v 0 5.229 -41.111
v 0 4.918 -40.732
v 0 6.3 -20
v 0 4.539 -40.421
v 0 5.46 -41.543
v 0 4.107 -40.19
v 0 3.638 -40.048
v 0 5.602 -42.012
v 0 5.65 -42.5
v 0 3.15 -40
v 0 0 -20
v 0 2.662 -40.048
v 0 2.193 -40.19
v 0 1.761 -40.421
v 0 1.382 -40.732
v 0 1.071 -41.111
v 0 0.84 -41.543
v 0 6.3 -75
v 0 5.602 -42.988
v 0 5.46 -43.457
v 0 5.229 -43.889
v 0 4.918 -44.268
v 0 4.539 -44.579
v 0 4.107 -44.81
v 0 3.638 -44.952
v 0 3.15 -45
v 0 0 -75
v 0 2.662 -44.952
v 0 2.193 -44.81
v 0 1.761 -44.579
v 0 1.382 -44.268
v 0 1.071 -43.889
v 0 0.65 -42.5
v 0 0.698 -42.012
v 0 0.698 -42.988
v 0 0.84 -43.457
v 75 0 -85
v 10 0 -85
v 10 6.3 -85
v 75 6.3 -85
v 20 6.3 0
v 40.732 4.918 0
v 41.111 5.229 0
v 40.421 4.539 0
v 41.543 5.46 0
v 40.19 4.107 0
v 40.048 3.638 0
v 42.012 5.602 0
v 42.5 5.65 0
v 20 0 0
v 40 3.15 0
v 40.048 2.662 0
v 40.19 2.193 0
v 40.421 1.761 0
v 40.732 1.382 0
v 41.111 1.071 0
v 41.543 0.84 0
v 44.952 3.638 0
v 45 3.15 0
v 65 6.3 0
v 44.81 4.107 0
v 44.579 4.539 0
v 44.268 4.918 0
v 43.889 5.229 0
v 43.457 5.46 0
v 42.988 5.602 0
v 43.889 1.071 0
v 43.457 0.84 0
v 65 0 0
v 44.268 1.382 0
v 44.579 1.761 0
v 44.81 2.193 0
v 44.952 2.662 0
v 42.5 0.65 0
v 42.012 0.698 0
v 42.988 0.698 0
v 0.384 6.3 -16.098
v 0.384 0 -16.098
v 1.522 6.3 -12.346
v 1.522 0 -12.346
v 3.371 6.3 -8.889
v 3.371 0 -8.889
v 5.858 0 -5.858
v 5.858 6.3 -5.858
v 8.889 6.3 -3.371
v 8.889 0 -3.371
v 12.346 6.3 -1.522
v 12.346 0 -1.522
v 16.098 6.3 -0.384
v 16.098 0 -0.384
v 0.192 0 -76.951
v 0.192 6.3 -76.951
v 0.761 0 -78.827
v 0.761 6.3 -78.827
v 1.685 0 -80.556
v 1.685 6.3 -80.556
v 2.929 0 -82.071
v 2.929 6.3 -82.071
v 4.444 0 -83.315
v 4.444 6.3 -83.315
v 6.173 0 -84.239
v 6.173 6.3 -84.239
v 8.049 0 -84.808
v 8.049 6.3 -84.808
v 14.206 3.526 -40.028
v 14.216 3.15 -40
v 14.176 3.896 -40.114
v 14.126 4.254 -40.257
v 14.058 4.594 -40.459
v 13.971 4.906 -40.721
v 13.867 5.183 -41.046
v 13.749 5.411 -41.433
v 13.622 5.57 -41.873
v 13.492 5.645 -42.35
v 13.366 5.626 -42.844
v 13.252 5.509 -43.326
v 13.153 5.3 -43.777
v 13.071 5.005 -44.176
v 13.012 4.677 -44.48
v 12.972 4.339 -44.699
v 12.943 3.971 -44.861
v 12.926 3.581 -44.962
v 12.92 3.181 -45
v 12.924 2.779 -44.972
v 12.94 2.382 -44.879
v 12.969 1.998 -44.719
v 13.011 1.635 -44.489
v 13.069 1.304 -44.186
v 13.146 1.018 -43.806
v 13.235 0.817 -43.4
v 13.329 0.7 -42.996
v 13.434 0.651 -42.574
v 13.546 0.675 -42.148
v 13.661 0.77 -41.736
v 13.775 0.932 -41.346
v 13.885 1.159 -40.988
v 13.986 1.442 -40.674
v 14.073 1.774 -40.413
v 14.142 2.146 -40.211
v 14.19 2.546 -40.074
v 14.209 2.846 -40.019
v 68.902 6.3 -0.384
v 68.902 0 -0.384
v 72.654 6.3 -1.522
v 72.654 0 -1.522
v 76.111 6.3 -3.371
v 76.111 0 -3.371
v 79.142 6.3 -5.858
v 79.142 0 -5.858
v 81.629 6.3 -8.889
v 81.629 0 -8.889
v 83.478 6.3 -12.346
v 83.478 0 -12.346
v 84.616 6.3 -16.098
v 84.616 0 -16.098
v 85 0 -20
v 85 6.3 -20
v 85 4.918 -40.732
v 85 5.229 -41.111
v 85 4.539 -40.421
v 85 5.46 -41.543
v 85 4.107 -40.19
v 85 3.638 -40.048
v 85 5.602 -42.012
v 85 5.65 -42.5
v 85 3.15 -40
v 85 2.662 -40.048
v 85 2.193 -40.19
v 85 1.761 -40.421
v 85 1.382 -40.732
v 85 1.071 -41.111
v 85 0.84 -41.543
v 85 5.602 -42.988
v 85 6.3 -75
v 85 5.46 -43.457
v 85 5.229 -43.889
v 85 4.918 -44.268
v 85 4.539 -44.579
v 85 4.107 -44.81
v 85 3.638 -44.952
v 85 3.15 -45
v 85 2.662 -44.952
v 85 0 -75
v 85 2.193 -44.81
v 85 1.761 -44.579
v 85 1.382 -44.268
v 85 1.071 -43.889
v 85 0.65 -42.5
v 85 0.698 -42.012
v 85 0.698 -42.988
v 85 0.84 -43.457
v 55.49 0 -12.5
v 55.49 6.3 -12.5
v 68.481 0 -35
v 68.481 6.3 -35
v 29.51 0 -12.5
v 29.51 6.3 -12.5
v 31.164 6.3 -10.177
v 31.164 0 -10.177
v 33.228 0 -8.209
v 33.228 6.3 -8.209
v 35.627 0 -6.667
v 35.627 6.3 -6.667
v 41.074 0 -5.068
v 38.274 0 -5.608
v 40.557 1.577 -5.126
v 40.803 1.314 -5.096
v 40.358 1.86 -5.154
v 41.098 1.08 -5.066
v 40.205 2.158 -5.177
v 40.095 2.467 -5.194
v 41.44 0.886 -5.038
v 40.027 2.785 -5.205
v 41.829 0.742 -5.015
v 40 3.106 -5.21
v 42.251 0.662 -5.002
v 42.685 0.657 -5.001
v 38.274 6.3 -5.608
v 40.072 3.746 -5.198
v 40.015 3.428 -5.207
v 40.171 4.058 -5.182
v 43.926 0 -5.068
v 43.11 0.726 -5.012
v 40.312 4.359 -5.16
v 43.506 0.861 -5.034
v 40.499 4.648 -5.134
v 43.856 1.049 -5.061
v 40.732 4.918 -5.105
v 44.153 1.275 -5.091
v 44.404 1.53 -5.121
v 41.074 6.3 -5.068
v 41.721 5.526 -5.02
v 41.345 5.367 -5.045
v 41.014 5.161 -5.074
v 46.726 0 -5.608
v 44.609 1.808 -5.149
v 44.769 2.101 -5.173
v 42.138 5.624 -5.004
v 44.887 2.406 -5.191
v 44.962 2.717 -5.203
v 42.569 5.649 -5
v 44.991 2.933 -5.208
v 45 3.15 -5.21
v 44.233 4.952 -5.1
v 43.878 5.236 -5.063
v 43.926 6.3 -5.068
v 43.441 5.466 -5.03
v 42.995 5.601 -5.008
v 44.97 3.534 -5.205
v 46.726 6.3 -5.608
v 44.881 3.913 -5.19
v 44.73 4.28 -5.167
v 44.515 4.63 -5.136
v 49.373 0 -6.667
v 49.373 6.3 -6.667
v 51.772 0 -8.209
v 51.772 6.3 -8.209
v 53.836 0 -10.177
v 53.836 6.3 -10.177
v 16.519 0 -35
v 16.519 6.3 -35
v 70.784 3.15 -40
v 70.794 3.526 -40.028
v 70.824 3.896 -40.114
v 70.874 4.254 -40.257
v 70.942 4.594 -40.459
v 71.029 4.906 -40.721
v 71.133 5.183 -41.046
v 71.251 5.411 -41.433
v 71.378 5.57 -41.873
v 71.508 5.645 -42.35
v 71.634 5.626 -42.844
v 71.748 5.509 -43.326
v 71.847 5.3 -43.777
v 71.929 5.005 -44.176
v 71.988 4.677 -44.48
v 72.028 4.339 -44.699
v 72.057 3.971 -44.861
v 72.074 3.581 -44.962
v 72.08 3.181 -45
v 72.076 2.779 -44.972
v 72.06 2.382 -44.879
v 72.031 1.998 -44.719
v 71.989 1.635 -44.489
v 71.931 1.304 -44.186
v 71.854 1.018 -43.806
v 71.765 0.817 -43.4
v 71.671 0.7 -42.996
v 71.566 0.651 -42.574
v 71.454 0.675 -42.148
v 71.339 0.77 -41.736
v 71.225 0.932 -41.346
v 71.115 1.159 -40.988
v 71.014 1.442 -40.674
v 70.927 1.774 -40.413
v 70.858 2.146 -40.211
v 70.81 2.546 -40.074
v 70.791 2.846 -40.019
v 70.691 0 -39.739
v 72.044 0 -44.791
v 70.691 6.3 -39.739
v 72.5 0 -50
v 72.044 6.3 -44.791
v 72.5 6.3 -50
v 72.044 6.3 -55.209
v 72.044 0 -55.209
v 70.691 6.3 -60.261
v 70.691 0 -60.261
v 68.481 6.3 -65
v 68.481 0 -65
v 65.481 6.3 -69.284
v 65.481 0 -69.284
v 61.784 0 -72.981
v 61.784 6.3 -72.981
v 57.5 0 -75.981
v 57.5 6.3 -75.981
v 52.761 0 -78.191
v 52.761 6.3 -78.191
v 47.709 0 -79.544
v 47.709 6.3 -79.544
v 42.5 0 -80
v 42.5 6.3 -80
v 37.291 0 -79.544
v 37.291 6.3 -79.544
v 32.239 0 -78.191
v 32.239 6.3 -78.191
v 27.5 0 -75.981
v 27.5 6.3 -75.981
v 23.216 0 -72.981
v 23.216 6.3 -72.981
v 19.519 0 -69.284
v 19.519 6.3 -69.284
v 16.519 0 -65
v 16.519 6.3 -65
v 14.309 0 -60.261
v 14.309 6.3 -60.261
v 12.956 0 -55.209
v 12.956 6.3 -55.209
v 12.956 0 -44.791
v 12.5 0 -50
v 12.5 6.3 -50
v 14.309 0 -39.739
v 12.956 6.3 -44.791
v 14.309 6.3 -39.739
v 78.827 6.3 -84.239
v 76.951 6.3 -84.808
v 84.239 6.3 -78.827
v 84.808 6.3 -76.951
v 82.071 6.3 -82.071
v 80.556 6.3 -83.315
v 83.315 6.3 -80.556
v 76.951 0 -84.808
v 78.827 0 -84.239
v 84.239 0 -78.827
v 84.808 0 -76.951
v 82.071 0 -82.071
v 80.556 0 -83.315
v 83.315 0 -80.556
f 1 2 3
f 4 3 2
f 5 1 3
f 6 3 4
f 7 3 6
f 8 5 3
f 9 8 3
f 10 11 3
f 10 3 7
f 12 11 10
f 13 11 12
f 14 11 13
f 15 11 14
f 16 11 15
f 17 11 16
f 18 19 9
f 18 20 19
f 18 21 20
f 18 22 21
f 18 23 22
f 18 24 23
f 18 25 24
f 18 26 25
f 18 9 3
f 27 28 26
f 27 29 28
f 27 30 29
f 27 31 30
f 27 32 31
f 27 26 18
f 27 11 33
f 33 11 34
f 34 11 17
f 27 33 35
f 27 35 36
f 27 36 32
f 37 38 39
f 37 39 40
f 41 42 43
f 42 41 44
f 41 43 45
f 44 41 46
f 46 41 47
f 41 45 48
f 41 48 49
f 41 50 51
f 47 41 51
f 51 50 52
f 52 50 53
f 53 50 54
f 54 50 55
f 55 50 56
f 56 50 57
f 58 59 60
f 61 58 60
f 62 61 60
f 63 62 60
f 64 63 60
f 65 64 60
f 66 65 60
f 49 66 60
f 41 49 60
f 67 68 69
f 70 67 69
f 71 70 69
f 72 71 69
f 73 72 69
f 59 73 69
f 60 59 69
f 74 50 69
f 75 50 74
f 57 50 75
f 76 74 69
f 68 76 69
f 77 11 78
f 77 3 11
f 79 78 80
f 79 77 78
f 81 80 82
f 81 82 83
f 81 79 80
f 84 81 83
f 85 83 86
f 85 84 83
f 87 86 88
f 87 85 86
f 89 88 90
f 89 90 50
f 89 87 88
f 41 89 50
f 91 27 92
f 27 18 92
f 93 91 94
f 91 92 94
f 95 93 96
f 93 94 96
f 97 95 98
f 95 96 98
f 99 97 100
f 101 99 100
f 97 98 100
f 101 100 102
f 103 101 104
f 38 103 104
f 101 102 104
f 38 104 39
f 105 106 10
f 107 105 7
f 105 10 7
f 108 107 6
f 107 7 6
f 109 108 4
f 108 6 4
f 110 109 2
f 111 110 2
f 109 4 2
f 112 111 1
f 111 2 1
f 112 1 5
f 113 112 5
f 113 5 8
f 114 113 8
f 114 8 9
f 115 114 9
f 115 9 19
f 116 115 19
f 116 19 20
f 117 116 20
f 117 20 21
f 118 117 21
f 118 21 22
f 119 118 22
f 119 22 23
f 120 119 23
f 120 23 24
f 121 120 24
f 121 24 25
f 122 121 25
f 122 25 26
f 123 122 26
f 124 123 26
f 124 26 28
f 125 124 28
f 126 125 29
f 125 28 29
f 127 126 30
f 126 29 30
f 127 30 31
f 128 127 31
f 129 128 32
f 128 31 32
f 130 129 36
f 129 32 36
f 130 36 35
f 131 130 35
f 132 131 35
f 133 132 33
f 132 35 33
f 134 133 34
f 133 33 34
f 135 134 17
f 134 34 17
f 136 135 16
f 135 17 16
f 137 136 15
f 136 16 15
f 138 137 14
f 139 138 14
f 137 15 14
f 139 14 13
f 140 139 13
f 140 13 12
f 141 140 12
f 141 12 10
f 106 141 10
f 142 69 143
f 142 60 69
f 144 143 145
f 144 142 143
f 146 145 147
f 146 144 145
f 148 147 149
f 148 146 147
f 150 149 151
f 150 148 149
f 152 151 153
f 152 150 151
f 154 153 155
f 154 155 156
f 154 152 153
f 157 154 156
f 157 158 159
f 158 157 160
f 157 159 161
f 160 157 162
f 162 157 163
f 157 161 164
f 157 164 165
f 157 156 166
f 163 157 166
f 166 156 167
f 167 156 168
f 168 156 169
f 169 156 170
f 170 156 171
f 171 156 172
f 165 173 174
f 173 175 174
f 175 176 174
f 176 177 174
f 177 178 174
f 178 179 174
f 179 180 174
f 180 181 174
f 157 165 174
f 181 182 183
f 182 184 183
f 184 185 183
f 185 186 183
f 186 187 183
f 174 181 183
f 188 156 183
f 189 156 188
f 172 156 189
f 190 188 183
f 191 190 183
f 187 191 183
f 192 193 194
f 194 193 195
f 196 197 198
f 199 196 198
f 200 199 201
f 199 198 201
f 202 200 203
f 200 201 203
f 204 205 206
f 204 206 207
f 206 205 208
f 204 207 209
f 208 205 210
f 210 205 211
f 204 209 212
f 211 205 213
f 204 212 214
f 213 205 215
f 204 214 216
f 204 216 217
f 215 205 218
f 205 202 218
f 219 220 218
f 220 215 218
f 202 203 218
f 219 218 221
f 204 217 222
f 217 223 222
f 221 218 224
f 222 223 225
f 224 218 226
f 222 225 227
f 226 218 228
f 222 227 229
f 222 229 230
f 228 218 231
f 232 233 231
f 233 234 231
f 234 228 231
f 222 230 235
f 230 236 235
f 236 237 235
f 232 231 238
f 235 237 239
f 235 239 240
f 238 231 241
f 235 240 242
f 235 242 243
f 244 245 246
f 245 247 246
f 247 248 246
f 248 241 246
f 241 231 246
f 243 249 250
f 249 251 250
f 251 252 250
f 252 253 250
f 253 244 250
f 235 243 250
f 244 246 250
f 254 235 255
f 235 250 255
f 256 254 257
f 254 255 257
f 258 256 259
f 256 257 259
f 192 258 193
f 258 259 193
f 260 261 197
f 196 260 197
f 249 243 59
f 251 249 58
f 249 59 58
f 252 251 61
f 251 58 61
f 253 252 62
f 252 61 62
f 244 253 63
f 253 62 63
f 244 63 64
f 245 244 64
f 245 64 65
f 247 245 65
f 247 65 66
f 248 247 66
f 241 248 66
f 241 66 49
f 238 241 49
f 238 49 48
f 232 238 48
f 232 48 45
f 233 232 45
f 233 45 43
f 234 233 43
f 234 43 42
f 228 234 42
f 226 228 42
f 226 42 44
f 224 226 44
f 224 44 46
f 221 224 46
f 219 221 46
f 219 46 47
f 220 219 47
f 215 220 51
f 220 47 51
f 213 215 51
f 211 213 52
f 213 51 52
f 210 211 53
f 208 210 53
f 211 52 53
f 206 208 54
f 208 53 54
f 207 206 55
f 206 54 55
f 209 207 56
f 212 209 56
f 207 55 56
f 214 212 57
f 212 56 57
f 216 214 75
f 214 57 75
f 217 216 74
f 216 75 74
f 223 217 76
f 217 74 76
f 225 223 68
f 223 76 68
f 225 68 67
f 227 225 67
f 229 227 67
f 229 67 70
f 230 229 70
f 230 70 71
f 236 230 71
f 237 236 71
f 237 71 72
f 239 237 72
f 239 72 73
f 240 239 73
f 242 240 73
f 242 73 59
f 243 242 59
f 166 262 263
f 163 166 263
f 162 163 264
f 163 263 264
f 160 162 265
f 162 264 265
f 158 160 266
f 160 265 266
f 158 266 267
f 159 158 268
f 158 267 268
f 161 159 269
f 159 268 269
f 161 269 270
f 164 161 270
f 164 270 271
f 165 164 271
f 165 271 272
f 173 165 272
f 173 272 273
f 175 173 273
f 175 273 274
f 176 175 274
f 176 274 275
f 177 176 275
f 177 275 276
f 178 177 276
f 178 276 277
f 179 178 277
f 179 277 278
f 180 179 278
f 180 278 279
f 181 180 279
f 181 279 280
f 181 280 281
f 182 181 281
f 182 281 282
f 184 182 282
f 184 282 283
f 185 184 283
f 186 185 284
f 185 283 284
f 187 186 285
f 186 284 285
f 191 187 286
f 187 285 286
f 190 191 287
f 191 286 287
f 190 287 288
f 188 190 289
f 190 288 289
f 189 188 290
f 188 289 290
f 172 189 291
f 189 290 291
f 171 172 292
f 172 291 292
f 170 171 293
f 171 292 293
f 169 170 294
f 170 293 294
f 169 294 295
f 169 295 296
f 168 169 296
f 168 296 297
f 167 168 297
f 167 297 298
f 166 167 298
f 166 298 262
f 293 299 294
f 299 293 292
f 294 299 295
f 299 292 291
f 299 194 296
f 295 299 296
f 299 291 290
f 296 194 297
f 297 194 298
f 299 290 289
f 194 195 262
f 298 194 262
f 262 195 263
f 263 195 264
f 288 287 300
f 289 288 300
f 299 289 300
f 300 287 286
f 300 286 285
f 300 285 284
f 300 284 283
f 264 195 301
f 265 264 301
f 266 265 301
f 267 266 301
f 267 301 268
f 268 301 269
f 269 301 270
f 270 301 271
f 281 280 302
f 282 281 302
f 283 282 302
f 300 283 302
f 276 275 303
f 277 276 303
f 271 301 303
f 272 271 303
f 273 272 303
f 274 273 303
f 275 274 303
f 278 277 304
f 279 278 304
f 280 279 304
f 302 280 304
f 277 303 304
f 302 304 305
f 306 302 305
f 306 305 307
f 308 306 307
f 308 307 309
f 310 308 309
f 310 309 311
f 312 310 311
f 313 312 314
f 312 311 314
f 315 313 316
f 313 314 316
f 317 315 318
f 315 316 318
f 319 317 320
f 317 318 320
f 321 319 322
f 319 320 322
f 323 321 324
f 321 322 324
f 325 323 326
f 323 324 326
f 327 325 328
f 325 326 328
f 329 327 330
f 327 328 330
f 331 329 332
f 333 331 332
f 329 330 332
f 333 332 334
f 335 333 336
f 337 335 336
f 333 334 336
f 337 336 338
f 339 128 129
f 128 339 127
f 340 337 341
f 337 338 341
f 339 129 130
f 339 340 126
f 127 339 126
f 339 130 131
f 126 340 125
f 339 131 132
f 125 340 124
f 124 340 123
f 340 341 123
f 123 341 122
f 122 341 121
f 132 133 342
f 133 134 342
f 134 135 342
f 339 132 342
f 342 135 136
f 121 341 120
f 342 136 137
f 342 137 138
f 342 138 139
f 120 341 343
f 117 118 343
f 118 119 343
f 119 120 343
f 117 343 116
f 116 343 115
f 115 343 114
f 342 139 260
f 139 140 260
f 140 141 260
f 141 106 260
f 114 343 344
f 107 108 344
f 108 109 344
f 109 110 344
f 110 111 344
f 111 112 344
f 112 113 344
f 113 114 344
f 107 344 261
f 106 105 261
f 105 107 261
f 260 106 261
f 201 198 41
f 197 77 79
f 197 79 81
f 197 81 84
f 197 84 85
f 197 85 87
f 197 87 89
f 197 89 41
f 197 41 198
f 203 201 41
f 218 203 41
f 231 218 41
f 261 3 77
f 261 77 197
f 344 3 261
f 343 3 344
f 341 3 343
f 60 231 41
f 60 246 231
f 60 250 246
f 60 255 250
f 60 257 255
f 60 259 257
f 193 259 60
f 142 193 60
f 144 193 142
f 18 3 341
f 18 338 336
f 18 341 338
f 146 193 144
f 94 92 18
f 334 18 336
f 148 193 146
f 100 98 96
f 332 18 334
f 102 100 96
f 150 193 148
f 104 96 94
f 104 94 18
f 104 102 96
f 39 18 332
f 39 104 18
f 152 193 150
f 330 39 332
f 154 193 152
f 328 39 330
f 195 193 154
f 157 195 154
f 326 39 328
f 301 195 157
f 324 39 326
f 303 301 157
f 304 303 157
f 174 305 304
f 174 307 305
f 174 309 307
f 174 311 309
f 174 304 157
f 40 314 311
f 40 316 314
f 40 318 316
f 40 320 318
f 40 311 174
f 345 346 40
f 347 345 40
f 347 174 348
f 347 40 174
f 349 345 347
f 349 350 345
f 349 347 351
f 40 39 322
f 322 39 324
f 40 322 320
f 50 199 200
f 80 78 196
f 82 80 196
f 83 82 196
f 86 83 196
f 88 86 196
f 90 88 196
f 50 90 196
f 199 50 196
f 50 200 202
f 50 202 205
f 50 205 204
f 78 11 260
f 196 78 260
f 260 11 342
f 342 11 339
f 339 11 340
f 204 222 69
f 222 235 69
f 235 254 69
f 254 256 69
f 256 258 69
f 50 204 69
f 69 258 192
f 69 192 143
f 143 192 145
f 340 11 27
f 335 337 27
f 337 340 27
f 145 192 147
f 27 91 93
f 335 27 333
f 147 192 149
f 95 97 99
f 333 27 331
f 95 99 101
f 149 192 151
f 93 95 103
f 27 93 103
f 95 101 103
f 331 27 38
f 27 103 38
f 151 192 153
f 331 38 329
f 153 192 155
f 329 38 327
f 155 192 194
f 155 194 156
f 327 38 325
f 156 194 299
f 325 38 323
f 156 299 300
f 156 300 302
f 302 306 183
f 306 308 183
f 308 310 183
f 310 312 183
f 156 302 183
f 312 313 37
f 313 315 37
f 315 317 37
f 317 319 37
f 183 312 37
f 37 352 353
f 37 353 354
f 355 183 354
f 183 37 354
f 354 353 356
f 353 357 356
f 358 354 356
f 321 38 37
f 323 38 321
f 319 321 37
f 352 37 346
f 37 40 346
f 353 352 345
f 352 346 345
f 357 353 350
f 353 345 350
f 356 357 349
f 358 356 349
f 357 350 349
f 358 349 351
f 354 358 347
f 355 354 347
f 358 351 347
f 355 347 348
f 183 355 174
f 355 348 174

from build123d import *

# Parameters (mm, degrees)
SKETCH1_W           = 85
SKETCH1_H           = 85
BOSS_EXTRUDE1_DEPTH = 6.3
CUT_EXTRUDE1_DEPTH  = 10
CUT_EXTRUDE2_REACH  = 87
SKETCH3_R           = 2.5
SKETCH4_R           = 2.5
CUT_EXTRUDE3_DEPTH  = 86
FILLET1_R           = 20
FILLET2_R           = 10


with BuildPart() as part:
    # Sketch1 → Boss-Extrude1 (new body)
    with BuildSketch(Plane(origin=(0, 0, 0), x_dir=(1, 0, 0), z_dir=(0, 1, 0))):
        with Locations((42.5, 42.5)):
            Rectangle(SKETCH1_W, SKETCH1_H)
    extrude(amount=BOSS_EXTRUDE1_DEPTH)

    # Sketch2 → Cut-Extrude1 (cut)
    with BuildSketch(Plane(origin=(0, 6.3, 0), x_dir=(1, 0, 0), z_dir=(0, 1, 0))):
        with BuildLine():
            Line((16.519237886, 35), (29.509618943, 12.5))
            ThreePointArc((29.509618943, 12.5), (42.5, 5), (55.490381057, 12.5))
            Line((55.490381057, 12.5), (68.480762114, 35))
            ThreePointArc((68.480762114, 35), (42.5, 80), (16.519237886, 35))
        make_face()
    extrude(amount=-CUT_EXTRUDE1_DEPTH, mode=Mode.SUBTRACT)

    # Sketch3 → Cut-Extrude2 (cut, up to next)
    with BuildSketch(Plane.XY, mode=Mode.PRIVATE) as cut_extrude2_sk1:
        with Locations((42.5, 3.15)):
            Circle(SKETCH3_R)
    cut_extrude2_tool1 = extrude(cut_extrude2_sk1.sketch, amount=-CUT_EXTRUDE2_REACH, mode=Mode.PRIVATE) & part.part
    add(cut_extrude2_tool1.solids().sort_by_distance((42.5, 3.15, 0))[0], mode=Mode.SUBTRACT)

    # Sketch4 → Cut-Extrude3 (cut, through all)
    with BuildSketch(Plane.ZY):
        with Locations((-42.5, 3.15)):
            Circle(SKETCH4_R)
    extrude(amount=-CUT_EXTRUDE3_DEPTH, mode=Mode.SUBTRACT)

    # Fillet1
    fillet1_edges = [part.edges().sort_by_distance(p)[0] for p in [
        (85, 3.15, 0),
        (0, 3.15, 0),
    ]]
    fillet(fillet1_edges, radius=FILLET1_R)

    # Fillet2
    fillet2_edges = [part.edges().sort_by_distance(p)[0] for p in [
        (0, 3.15, -85),
        (85, 3.15, -85),
    ]]
    fillet(fillet2_edges, radius=FILLET2_R)


solid = part.part
